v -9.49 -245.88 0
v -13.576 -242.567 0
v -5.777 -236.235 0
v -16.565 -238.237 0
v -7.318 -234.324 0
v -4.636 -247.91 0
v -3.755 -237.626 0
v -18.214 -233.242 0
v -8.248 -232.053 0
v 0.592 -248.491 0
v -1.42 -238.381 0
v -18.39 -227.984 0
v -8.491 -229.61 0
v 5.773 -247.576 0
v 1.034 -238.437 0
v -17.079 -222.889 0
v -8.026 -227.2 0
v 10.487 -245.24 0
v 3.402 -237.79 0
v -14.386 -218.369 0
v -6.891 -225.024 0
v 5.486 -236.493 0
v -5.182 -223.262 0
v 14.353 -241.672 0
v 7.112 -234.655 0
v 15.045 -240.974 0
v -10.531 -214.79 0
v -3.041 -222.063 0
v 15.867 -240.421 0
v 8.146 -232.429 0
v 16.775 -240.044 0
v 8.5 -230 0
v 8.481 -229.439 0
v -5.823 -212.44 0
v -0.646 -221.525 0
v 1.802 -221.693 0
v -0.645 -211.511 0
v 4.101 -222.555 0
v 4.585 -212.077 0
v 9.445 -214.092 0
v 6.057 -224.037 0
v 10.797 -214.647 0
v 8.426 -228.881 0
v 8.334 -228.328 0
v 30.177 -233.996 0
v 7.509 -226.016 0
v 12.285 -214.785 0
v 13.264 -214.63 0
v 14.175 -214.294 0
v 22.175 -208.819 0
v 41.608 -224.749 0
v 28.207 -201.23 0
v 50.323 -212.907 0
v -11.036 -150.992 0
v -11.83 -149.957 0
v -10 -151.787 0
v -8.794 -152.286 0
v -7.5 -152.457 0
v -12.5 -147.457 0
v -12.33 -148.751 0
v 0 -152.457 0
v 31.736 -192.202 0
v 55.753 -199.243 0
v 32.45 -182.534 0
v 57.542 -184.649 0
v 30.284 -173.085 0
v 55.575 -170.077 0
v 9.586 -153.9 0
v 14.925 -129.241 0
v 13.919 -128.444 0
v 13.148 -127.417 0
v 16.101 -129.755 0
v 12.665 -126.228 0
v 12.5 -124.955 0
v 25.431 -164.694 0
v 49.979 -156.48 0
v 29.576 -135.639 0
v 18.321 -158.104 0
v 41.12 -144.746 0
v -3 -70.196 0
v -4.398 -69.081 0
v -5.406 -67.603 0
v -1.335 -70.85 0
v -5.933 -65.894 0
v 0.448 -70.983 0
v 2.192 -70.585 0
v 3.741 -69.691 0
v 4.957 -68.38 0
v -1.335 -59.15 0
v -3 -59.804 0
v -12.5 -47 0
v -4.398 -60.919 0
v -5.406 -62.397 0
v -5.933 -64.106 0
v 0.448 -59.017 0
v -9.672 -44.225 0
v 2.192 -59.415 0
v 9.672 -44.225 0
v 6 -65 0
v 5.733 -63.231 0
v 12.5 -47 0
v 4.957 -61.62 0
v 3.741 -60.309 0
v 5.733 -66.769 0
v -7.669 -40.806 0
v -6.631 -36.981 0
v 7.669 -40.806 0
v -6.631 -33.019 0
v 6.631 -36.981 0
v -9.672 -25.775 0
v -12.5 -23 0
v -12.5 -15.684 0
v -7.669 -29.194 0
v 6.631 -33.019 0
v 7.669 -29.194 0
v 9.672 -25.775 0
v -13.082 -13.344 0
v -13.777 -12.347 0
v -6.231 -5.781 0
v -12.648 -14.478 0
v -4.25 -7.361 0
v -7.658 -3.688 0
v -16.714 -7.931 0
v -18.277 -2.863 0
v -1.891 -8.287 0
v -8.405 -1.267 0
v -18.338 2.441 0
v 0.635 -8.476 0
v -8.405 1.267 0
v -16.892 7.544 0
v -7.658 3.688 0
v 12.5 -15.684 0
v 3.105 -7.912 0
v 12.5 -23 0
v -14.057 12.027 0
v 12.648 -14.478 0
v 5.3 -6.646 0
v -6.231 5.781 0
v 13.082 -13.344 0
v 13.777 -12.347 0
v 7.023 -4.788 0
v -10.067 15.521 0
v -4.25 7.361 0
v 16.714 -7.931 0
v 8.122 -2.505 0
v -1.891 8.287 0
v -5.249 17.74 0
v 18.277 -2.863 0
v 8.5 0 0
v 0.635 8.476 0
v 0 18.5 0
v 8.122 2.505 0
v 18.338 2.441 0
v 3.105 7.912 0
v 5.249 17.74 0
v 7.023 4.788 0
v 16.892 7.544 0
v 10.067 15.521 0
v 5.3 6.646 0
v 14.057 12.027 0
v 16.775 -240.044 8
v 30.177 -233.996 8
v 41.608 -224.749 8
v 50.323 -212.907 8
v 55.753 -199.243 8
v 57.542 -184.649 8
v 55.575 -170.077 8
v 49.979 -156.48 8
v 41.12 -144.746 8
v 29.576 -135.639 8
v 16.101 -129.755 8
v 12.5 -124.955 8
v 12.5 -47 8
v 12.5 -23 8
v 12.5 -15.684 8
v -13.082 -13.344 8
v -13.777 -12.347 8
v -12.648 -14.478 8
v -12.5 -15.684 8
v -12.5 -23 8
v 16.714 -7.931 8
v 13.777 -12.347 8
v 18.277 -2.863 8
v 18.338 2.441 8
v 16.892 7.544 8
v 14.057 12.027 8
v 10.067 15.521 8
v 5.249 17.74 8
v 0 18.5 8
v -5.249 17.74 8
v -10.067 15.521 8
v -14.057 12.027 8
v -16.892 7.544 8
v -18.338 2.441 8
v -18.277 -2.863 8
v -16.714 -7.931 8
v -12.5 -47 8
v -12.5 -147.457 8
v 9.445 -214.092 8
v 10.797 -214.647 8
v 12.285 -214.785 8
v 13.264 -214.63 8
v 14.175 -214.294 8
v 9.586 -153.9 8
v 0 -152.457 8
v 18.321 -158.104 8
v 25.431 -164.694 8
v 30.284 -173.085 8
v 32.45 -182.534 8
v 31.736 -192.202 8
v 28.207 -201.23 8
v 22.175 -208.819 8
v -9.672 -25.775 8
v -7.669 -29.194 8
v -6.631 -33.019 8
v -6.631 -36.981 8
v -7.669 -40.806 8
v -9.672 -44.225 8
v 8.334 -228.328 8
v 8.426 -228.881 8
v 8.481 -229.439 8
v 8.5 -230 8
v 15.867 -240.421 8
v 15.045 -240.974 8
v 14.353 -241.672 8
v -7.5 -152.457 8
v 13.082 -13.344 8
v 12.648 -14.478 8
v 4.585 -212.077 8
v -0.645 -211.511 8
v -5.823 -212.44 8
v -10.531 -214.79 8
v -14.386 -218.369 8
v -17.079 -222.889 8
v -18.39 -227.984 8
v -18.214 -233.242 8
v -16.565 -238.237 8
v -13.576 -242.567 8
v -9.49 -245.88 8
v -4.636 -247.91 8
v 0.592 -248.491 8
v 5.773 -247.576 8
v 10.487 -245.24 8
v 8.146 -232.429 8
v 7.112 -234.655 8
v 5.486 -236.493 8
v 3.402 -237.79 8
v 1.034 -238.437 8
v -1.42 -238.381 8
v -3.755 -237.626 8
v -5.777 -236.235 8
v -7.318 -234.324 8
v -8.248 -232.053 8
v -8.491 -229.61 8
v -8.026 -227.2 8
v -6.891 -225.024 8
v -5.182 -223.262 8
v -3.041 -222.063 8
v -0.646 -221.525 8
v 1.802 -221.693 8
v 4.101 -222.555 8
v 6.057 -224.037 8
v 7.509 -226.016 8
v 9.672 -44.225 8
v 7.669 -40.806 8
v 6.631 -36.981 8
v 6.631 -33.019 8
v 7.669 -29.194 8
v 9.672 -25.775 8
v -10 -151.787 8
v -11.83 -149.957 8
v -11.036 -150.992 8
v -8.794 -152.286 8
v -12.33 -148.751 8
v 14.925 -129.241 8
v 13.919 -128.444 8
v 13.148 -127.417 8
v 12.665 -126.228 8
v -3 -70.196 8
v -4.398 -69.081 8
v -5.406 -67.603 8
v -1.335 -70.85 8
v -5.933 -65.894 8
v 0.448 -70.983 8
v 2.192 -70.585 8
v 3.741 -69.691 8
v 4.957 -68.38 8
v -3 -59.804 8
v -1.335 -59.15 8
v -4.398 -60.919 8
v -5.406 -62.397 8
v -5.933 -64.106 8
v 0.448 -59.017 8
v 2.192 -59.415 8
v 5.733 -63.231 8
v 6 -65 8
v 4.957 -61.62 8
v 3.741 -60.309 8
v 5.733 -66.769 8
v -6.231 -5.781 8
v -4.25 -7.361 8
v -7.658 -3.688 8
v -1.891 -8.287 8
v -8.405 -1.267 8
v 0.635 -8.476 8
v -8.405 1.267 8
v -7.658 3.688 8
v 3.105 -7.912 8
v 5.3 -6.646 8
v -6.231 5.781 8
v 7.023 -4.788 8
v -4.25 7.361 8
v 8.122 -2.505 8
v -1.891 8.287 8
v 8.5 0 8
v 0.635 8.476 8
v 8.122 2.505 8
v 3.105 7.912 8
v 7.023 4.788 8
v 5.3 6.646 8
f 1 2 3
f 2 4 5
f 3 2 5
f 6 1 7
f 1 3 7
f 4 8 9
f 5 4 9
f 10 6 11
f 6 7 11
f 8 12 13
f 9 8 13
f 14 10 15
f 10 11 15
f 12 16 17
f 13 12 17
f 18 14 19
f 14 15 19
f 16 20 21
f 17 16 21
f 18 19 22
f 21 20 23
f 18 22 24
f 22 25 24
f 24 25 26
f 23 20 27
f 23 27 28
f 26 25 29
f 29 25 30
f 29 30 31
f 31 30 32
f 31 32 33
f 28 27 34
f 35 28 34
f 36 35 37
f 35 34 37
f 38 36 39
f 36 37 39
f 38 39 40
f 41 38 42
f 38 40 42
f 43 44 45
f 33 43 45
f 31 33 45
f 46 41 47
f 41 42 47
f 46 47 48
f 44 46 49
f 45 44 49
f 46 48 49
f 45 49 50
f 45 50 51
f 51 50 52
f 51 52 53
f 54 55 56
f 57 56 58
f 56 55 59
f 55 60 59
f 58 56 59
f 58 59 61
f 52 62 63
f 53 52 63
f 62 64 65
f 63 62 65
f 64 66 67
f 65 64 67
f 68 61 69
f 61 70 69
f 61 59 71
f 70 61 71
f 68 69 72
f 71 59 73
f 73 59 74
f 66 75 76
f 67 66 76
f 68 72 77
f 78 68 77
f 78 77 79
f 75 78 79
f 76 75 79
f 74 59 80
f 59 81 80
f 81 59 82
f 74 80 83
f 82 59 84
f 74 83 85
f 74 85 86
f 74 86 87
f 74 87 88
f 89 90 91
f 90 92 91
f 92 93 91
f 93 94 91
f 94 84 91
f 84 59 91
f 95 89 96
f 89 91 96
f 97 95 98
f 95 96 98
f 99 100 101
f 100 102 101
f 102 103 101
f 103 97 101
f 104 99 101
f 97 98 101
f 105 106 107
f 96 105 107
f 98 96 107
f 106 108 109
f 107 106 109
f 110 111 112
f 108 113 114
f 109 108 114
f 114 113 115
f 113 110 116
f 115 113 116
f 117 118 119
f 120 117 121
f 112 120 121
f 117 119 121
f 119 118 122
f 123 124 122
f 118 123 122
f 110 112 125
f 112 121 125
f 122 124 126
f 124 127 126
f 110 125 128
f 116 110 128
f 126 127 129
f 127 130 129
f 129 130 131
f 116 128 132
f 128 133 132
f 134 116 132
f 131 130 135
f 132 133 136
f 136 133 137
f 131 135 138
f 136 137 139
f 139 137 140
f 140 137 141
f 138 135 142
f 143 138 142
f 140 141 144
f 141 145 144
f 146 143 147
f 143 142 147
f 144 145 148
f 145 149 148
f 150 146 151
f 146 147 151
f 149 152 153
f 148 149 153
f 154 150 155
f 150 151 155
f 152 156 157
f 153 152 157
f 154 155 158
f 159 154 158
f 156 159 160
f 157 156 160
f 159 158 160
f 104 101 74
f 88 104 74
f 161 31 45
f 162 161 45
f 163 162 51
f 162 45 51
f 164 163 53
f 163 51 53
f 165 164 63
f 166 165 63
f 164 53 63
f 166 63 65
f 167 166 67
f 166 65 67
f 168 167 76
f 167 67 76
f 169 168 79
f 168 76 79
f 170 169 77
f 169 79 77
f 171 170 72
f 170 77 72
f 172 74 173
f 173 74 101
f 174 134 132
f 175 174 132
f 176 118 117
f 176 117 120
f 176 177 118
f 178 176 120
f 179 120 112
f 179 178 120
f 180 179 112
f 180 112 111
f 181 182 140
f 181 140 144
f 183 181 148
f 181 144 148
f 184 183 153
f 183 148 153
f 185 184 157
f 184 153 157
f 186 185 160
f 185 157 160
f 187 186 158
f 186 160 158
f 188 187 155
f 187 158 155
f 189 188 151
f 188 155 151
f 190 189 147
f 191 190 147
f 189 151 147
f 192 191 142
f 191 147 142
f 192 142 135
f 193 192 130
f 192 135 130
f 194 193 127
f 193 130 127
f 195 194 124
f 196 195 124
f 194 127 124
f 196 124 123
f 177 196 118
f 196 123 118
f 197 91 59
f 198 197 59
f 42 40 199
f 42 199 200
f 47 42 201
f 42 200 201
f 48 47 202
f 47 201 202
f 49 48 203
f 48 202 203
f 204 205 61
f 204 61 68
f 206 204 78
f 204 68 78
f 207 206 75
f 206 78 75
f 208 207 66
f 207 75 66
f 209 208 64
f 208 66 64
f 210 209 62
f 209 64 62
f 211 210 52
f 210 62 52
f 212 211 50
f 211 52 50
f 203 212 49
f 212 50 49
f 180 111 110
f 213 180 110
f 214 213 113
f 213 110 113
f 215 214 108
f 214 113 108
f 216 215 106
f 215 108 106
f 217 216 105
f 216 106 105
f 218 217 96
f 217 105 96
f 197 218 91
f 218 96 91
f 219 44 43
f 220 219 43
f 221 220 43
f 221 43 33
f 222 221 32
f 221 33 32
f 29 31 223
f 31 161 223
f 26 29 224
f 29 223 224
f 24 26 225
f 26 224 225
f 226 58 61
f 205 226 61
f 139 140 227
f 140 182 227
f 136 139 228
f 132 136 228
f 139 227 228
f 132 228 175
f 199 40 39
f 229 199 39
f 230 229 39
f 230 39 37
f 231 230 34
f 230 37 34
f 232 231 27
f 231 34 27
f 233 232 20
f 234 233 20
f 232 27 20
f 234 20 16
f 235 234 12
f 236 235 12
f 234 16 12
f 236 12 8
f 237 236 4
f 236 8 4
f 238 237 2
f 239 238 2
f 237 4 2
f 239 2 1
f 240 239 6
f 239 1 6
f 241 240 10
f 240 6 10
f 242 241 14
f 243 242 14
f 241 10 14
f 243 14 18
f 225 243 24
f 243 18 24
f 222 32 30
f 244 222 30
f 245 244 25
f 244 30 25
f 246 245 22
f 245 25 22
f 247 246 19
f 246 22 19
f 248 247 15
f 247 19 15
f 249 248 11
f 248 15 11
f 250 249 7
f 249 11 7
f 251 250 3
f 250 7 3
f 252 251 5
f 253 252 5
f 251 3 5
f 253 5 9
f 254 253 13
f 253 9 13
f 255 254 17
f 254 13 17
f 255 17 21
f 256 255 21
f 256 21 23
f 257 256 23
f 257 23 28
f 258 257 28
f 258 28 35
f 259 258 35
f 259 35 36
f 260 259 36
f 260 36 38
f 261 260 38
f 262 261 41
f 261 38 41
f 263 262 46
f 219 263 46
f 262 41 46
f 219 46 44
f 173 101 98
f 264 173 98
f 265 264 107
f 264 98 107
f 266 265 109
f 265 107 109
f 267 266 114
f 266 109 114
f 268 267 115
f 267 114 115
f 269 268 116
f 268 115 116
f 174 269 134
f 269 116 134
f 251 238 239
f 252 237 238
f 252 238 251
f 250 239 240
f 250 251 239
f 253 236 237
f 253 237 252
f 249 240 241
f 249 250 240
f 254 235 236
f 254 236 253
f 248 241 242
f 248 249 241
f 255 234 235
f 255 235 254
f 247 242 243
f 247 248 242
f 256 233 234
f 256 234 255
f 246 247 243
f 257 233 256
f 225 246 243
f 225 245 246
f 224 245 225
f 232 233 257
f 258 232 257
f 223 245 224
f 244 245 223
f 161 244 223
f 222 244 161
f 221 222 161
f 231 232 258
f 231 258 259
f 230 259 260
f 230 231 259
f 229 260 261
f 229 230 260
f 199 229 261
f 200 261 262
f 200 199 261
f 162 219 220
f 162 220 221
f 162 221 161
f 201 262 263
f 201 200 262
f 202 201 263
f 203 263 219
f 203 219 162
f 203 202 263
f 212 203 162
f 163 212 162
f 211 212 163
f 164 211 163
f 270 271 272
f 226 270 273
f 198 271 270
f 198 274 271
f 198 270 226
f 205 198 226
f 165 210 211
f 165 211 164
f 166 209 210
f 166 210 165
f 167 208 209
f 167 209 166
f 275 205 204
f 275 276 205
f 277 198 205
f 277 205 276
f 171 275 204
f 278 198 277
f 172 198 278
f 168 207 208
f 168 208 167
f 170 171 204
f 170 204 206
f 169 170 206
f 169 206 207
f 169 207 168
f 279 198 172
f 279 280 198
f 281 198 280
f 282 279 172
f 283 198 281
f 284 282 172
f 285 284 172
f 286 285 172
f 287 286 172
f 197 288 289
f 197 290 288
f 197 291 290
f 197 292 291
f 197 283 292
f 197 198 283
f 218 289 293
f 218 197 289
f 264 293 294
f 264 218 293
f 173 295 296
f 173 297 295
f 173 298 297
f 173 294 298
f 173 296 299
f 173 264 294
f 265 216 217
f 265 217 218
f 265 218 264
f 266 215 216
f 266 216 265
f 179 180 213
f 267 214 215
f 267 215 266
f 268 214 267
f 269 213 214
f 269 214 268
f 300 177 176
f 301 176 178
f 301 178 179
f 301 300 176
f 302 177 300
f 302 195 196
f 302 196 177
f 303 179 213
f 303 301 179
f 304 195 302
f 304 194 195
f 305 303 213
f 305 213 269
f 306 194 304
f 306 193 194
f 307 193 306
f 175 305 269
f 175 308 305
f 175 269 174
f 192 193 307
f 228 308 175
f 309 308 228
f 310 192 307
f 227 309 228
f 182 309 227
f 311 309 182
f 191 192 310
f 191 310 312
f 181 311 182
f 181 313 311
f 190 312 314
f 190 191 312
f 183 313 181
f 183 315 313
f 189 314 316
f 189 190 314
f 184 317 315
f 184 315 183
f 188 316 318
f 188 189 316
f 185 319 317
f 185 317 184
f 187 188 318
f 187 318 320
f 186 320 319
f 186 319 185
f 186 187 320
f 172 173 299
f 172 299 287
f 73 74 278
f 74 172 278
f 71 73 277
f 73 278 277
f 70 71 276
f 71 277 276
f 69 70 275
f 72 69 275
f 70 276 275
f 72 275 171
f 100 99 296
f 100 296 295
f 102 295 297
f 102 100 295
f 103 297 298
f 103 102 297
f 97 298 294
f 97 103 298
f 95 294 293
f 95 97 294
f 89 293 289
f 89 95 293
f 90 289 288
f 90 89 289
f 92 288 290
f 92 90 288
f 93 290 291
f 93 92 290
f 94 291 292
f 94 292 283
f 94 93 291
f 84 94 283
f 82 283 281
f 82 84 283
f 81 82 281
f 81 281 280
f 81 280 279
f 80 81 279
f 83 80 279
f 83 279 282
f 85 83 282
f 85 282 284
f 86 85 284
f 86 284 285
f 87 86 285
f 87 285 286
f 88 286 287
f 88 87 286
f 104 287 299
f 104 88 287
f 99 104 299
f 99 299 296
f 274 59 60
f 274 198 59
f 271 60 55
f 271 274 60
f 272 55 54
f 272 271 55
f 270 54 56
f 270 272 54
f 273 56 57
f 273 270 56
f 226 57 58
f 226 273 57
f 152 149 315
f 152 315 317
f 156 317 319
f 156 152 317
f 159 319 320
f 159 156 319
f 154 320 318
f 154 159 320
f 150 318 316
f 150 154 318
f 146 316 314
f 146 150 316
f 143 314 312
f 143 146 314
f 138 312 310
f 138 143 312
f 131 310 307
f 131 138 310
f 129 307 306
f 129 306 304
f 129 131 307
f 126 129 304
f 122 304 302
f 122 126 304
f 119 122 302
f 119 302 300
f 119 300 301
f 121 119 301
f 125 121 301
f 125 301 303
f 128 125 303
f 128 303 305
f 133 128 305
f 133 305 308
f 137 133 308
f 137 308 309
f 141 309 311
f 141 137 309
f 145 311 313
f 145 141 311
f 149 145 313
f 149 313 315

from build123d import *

# Parameters (mm, degrees)
SKETCH1_R           = 6
SKETCH1_R_2         = 8.5
BOSS_EXTRUDE1_DEPTH = 8
FILLET1_R           = 5


with BuildPart() as part:
    # Sketch1 → Boss-Extrude1 (new body)
    with BuildSketch(Plane.XY):
        with BuildLine():
            ThreePointArc((12.5, -13.638181697), (0, 18.5), (-12.5, -13.638181697))
            Line((-12.5, -13.638181697), (-12.5, -23))
            ThreePointArc((-12.5, -23), (-6.5, -35), (-12.5, -47))
            Line((-12.5, -47), (-12.5, -152.456671403))
            Line((-12.5, -152.456671403), (0, -152.456671403))
            ThreePointArc((0, -152.456671403), (32.019441409, -179.184193262), (11.444366088, -215.464647068))
            ThreePointArc((11.444366088, -215.464647068), (-18.29086587, -232.773846738), (15.239317045, -240.488718511))
            ThreePointArc((15.239317045, -240.488718511), (57.52601951, -183.58870793), (12.5, -128.830749818))
            Line((12.5, -128.830749818), (12.5, -47))
            ThreePointArc((12.5, -47), (6.5, -35), (12.5, -23))
            Line((12.5, -23), (12.5, -13.638181697))
        make_face()
        with BuildLine():
            ThreePointArc((8.333859781, -228.327642037), (8.458362966, -229.159704854), (8.5, -230))
            ThreePointArc((8.5, -230), (-8.458362966, -230.840295146), (8.333859781, -228.327642037))
        make_face(mode=Mode.SUBTRACT)
        with Locations((0, -65)):
            Circle(SKETCH1_R, mode=Mode.SUBTRACT)
        Circle(SKETCH1_R_2, mode=Mode.SUBTRACT)
    extrude(amount=BOSS_EXTRUDE1_DEPTH)

    # Fillet1
    fillet1_edges = [part.edges().sort_by_distance(p)[0] for p in [
        (11.444366088, -215.464647068, 4),
        (-12.5, -152.456671403, 4),
        (-12.5, -13.638181697, 4),
        (12.5, -13.638181697, 4),
        (12.5, -128.830749818, 4),
        (15.239317045, -240.488718511, 4),
    ]]
    fillet(fillet1_edges, radius=FILLET1_R)


solid = part.part
